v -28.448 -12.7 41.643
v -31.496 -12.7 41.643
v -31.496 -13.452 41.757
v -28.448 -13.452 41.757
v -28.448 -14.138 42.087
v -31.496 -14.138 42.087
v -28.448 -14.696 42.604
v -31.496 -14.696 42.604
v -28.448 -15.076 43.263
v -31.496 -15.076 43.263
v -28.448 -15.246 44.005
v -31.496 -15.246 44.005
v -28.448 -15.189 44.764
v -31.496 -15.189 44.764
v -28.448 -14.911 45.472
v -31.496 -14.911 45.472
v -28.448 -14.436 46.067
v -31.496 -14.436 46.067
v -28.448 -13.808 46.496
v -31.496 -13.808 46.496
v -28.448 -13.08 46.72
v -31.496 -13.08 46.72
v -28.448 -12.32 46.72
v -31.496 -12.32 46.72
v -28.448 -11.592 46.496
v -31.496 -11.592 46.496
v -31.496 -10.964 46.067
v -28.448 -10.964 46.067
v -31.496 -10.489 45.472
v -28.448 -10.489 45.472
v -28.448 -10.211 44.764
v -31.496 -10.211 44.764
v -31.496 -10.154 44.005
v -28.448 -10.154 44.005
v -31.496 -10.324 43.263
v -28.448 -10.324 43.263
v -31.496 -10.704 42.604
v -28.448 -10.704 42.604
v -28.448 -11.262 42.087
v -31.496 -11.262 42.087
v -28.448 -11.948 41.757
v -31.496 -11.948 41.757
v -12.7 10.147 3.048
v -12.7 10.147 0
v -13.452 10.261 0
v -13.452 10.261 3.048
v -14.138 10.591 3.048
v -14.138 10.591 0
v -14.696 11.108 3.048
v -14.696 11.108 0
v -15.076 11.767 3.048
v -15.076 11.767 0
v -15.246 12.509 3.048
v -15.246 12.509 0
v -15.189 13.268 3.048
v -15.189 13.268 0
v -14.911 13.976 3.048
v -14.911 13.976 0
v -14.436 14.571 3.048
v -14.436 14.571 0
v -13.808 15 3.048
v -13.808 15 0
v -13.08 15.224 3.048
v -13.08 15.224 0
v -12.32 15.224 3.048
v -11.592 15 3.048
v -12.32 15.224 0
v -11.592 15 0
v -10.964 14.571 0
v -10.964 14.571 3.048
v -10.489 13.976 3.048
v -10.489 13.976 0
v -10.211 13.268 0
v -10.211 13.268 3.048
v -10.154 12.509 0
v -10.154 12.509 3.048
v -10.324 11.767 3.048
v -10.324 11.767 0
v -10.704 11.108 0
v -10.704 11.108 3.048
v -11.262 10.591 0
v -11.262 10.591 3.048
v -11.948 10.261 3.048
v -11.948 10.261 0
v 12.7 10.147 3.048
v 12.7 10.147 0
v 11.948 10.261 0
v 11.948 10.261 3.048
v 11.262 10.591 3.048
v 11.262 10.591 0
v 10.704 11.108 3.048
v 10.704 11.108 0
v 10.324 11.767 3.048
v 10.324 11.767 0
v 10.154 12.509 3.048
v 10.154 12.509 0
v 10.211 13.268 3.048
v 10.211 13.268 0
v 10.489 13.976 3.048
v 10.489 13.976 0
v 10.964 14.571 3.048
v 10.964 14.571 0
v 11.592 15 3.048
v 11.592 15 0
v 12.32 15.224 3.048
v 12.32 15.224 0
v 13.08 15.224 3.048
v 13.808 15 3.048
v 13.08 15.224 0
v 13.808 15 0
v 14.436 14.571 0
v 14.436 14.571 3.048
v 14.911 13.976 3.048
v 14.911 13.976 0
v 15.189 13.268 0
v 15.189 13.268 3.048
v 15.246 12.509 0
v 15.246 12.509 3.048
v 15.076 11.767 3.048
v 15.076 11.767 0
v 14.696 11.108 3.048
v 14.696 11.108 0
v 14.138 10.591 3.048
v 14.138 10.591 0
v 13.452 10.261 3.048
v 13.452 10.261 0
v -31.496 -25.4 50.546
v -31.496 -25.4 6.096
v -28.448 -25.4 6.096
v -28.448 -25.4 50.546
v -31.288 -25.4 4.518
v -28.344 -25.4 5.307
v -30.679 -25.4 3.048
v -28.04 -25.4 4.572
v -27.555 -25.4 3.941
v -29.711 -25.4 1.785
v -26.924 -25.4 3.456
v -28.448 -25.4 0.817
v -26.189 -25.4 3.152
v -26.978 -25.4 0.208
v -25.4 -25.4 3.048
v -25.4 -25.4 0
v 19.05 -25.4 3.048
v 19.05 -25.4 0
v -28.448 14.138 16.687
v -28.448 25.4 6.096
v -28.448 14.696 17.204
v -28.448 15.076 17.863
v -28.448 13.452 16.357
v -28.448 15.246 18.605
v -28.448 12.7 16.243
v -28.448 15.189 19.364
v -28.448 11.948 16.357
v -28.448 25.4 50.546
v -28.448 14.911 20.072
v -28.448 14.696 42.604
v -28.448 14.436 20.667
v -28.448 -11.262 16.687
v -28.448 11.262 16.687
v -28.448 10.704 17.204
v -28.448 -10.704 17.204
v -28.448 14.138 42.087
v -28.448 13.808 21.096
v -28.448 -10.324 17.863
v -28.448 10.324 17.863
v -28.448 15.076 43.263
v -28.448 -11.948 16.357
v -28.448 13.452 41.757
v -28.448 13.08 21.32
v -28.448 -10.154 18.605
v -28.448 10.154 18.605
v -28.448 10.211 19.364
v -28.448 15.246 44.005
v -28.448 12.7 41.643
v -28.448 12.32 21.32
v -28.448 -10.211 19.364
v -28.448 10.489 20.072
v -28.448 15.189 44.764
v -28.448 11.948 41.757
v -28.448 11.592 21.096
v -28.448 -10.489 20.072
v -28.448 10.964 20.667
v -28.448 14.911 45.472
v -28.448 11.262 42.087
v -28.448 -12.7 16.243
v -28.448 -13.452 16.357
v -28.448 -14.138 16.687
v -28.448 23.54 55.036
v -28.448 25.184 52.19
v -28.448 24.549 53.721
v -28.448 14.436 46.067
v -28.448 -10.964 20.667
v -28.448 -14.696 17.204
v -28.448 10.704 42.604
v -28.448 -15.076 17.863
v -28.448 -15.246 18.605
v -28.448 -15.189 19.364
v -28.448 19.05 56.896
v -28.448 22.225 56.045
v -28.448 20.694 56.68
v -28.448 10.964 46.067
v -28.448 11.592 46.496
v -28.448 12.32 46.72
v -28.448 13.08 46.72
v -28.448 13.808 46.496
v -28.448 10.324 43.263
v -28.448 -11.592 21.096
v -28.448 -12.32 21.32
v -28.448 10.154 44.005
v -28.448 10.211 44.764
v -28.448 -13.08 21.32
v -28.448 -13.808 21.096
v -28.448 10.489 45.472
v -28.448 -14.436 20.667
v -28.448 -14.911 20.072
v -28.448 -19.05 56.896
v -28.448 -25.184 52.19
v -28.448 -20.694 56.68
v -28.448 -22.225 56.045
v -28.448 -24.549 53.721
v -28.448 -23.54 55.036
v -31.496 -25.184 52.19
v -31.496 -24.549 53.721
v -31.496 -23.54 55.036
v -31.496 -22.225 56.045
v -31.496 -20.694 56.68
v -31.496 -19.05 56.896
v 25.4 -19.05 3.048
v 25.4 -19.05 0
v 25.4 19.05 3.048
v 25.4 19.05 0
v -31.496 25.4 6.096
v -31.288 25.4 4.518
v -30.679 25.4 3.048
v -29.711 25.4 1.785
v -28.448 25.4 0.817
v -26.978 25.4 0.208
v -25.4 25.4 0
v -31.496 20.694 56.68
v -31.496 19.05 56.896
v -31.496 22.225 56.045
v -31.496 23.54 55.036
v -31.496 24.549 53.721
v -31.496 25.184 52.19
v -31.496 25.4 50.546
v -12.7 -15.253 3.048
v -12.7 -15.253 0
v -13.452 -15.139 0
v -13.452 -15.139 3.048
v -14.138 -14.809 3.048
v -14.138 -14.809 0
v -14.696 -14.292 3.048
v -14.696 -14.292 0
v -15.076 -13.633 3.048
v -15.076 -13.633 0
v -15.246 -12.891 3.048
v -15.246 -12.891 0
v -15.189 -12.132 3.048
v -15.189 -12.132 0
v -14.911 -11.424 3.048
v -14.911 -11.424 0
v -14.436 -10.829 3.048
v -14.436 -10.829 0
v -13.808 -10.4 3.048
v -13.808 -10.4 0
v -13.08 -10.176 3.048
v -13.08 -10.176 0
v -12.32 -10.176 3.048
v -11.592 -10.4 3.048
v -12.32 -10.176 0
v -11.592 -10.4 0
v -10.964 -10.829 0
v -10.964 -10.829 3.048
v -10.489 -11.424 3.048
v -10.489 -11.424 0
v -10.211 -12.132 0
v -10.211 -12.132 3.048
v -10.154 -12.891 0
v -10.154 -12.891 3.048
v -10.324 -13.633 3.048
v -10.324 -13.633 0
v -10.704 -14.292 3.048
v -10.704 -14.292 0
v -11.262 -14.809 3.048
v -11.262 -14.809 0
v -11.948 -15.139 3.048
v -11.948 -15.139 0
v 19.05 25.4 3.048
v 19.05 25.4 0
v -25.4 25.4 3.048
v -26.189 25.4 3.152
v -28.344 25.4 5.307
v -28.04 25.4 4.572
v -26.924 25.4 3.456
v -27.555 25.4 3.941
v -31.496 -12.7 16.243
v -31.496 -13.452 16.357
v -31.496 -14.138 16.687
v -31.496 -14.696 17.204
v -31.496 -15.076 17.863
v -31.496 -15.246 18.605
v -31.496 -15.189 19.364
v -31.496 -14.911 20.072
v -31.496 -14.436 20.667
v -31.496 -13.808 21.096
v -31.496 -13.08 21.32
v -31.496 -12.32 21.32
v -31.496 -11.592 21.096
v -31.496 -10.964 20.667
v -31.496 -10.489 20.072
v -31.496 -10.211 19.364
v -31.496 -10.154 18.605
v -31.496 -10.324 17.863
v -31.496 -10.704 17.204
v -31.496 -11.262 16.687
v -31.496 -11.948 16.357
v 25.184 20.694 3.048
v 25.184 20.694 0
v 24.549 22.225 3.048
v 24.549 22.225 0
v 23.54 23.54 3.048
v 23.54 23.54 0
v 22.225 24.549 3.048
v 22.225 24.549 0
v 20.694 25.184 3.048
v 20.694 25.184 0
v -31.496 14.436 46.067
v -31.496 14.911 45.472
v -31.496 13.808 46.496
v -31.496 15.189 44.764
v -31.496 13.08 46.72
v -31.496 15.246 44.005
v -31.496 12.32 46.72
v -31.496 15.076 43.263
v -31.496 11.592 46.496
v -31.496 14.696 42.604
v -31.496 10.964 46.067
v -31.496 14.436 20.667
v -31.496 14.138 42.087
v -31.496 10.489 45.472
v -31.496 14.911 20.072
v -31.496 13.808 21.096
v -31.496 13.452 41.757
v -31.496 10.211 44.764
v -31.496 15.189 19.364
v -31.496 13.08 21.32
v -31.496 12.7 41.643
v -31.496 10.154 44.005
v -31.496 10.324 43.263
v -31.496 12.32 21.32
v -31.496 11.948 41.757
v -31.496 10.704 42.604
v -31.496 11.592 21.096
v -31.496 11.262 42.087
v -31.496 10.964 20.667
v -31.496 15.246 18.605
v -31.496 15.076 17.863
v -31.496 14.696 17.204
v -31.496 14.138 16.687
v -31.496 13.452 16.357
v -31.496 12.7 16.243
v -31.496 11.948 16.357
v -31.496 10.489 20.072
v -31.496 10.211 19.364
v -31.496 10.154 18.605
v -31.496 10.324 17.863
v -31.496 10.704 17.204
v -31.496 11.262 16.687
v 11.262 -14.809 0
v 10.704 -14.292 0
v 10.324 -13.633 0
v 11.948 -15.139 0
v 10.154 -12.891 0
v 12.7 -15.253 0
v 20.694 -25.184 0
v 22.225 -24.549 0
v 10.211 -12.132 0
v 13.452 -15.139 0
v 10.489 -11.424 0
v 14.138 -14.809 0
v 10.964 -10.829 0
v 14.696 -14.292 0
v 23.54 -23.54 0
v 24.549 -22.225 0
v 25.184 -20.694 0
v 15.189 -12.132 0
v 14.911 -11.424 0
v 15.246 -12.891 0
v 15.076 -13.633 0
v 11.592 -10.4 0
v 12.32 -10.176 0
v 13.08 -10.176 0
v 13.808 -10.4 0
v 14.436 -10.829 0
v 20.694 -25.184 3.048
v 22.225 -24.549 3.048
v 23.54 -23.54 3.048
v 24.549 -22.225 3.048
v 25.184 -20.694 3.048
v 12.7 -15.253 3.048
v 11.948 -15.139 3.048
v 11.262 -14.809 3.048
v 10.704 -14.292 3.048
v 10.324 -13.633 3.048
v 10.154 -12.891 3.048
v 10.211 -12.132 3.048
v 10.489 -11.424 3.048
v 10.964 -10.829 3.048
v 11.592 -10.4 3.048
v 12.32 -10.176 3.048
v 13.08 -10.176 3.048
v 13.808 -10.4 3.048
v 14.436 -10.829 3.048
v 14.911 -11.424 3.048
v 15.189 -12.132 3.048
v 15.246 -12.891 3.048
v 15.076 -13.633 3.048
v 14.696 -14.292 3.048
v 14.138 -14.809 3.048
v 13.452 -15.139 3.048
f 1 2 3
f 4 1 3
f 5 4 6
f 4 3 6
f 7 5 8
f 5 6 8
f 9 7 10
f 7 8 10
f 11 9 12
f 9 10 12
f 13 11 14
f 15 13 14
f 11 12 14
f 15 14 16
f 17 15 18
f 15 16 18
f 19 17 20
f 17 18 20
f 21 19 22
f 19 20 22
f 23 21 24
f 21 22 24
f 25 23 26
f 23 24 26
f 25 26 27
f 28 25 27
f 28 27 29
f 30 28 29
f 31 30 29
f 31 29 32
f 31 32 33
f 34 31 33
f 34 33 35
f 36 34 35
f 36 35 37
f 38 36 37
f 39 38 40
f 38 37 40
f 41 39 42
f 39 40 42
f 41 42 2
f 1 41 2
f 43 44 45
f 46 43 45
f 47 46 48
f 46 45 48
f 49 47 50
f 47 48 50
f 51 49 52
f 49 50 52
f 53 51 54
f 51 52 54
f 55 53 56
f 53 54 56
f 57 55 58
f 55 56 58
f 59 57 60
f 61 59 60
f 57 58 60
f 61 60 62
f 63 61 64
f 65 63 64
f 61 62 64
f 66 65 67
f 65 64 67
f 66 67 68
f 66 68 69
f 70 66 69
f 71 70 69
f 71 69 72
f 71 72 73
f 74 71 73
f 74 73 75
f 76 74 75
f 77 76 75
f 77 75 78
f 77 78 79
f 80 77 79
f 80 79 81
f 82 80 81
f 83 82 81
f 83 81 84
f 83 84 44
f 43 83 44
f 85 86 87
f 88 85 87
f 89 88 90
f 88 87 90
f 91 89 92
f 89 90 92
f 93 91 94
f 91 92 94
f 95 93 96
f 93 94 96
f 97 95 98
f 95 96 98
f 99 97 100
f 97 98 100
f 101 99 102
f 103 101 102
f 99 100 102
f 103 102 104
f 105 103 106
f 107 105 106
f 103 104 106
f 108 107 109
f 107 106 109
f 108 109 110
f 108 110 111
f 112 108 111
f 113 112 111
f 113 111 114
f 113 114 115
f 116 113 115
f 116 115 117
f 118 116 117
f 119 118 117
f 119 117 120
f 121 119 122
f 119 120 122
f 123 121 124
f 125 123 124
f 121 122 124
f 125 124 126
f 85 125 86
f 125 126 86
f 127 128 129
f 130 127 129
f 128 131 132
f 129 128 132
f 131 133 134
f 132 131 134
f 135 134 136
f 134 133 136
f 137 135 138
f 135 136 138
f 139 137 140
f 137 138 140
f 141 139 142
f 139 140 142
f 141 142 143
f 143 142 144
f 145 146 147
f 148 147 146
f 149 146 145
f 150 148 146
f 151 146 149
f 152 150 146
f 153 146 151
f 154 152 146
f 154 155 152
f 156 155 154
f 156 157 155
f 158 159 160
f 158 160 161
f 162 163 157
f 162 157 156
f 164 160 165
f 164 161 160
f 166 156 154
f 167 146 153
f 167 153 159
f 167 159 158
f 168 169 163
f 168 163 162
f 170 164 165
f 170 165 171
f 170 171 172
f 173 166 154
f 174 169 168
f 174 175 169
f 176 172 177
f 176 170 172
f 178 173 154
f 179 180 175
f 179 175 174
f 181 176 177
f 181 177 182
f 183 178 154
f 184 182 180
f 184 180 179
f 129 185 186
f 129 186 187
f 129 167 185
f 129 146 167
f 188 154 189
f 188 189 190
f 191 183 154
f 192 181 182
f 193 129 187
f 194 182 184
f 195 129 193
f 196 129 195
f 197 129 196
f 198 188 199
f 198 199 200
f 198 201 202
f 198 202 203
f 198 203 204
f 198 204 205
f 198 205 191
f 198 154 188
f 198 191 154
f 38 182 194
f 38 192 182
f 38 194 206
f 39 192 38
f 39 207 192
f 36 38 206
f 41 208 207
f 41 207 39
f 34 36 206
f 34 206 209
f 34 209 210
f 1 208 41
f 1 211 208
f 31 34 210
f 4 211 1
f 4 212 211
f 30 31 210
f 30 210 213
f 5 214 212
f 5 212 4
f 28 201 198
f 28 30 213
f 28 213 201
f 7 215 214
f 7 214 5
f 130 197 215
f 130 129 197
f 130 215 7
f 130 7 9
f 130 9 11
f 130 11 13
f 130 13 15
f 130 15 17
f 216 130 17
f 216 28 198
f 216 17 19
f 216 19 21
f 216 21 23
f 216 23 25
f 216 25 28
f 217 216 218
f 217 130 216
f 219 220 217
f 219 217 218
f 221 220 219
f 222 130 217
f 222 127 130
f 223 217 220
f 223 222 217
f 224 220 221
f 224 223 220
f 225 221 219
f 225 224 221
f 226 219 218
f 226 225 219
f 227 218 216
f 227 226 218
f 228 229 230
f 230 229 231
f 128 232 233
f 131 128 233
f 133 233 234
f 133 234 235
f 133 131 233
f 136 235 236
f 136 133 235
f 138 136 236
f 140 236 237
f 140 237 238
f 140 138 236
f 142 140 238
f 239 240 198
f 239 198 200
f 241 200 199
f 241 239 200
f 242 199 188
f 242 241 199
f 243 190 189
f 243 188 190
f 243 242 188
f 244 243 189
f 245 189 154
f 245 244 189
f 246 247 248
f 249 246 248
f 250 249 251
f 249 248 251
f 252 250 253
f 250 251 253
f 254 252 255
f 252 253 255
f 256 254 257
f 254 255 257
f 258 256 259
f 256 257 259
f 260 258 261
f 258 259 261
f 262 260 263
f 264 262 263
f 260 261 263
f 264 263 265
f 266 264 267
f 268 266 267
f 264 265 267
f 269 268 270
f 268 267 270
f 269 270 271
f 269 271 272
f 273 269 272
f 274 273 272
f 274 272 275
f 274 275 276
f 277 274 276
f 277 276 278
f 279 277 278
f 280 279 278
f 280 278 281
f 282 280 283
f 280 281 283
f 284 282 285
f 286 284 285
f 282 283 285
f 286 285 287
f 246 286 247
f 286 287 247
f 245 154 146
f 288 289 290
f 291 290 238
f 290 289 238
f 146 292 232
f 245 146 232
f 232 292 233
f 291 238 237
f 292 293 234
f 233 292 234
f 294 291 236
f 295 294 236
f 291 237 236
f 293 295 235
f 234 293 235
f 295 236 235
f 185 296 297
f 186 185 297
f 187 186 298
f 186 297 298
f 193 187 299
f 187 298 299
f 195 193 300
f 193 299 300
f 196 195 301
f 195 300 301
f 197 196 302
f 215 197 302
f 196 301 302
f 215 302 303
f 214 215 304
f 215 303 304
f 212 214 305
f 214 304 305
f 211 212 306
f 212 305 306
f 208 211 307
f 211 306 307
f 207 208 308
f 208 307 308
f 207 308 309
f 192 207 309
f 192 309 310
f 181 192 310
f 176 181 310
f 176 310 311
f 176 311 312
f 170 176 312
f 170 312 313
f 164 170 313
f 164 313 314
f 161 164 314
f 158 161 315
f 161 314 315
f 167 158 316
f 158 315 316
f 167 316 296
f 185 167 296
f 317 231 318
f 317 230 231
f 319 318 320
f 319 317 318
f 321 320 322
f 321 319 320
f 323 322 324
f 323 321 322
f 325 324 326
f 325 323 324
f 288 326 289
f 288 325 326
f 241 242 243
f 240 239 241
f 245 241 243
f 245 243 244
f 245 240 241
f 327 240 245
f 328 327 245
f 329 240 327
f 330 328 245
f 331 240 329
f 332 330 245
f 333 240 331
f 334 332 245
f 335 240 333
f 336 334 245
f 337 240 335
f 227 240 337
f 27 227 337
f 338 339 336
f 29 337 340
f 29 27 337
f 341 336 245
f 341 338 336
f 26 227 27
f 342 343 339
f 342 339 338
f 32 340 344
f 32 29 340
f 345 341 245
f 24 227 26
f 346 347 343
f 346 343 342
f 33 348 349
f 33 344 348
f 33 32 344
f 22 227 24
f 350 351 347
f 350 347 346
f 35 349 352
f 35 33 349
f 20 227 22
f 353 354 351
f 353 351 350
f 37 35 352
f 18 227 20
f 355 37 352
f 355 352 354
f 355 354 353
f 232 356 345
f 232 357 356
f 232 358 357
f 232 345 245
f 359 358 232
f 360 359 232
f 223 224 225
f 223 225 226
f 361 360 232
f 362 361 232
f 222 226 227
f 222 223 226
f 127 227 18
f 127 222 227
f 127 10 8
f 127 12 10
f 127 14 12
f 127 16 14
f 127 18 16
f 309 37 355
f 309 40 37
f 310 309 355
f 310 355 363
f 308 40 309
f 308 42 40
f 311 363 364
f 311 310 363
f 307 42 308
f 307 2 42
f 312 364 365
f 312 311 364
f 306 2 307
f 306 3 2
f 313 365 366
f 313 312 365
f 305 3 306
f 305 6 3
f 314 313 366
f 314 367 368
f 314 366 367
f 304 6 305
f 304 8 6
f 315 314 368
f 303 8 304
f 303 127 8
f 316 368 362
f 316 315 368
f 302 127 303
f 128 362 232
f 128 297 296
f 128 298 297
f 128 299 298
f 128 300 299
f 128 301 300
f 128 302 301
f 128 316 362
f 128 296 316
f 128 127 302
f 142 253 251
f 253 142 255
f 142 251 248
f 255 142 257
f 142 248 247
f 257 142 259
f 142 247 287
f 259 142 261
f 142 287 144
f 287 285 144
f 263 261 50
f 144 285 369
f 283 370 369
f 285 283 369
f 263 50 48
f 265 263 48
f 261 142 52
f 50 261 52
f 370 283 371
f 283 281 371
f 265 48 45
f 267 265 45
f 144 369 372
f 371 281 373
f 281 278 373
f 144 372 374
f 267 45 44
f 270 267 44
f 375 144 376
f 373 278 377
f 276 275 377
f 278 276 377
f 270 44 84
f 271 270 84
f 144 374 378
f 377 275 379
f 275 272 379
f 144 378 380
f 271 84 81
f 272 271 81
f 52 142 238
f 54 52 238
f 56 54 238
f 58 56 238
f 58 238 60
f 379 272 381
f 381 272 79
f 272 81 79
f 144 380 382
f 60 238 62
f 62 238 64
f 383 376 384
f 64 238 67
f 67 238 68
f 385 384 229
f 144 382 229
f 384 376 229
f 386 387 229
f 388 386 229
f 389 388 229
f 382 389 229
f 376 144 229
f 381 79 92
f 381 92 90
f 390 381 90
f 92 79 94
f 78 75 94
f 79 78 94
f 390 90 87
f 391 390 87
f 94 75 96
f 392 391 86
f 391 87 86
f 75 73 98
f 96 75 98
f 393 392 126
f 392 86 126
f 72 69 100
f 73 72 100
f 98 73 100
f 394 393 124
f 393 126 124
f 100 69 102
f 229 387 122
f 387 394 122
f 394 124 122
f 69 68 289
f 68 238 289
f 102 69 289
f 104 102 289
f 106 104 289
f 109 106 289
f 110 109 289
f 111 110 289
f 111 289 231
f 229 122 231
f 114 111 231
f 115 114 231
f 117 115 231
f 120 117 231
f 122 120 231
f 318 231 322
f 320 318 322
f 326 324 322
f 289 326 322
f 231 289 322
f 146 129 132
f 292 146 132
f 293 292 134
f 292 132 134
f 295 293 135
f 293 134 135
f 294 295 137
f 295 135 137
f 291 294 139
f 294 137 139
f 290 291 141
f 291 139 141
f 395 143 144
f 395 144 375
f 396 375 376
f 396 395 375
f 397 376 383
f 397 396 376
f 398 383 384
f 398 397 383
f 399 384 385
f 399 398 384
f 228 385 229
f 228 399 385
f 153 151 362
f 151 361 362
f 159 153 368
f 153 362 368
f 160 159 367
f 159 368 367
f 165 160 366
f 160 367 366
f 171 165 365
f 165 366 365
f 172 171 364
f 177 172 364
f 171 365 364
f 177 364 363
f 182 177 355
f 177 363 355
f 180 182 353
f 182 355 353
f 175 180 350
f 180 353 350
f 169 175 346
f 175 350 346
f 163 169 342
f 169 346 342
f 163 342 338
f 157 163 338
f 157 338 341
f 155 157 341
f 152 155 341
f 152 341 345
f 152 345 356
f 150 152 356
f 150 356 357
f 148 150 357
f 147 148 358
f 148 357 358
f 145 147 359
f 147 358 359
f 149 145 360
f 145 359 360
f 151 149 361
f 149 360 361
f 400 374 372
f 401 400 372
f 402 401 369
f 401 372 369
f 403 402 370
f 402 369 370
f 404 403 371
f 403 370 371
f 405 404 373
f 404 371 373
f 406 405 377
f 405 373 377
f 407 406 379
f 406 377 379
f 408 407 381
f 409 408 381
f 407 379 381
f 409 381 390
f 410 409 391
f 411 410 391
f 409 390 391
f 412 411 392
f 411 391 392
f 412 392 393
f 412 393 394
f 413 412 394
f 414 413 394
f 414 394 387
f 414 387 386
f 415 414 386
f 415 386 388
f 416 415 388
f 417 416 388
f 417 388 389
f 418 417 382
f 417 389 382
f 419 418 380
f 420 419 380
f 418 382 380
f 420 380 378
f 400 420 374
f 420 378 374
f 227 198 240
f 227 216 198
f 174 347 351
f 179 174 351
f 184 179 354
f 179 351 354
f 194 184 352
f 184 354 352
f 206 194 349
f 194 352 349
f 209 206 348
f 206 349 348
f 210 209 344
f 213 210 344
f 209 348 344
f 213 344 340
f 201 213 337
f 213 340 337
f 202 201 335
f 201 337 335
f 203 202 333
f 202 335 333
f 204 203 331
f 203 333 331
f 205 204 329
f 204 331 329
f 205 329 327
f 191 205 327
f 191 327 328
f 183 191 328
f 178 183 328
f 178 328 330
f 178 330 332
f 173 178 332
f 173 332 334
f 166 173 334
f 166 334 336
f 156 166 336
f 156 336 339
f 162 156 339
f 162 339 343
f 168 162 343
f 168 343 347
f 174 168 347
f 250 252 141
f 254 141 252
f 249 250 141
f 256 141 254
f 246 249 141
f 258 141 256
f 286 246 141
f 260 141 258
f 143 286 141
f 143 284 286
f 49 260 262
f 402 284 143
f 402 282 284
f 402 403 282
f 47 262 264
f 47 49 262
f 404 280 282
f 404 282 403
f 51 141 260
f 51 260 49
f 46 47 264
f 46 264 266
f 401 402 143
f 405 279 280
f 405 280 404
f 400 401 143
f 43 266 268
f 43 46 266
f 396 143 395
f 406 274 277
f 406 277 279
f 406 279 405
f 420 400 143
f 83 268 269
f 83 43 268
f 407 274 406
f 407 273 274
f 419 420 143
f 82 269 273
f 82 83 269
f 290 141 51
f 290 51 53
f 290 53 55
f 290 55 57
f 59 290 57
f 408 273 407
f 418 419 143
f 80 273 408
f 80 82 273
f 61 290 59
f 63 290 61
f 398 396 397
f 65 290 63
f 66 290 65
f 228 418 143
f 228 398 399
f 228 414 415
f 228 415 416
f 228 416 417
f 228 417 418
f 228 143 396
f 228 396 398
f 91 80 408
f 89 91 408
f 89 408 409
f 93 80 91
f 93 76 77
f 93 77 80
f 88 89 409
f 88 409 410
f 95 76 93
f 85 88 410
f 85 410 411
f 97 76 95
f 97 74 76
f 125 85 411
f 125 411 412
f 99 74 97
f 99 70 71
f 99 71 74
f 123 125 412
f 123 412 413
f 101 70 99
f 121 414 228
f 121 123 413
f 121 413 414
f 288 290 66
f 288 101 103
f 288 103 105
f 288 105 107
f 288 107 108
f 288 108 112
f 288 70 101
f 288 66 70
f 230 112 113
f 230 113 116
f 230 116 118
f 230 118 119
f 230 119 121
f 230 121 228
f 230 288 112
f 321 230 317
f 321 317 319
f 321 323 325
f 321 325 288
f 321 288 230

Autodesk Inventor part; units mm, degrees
ref_plane "YZ Plane" through (0, 0, 0) normal (1, 0, 0) x (0, 1, 0)
ref_plane "XZ Plane" through (0, 0, 0) normal (0, 1, 0) x (-1, 0, 0)
ref_plane "XY Plane" through (0, 0, 0) normal (0, 0, 1) x (1, 0, 0)
sketch "Sketch1" plane through (0, 0, 0) normal (0, 0, 1) x (1, 0, 0)
  line L0 (25.4, 25.4) -> (-25.4, 25.4)
  line L1 (-25.4, 25.4) -> (-25.4, -25.4)
  line L2 (-25.4, -25.4) -> (25.4, -25.4)
  line L3 (25.4, -25.4) -> (25.4, 25.4)
  line L4 (25.4, 25.4) -> (-25.4, -25.4) construction
  line L5 (-25.4, 25.4) -> (25.4, -25.4) construction
  point P0 (0, 0)
  dimension "d0" = 50.8
  dimension "d1" = 50.8
extrude "Plate1" add sketch "Sketch1" along normal blind 3.048
sketch "Sketch2" plane through (-28.448, -25.4, 6.096) normal (-1, 0, 0) x (0, -1, 0)
  line L0 (-50.8, 0) -> (0, 0)
  line L1 (0, 0) -> (0, 50.8)
  line L2 (0, 50.8) -> (-50.8, 50.8)
  line L3 (-50.8, 50.8) -> (-50.8, 0)
edge flange "Flange1" height 56.896 angle 90 thickness 3.048 bend radius 3.048 thickness toward (-1, 0, 0) relief tear relief width 3.048 relief depth 1.524 edges at (-25.4, 0, 3.048) wall of the first edge with corners at (-28.448, 25.4, 6.096) (-28.448, -25.4, 6.096) (-28.448, -25.4, 56.896) (-28.448, 25.4, 56.896)
bend "Bend1"
corner "Corner1"
sketch "Sketch3" plane through (-28.448, -25.4, 56.896) normal (1, 0, 0) x (0, 0, -1)
  line L0 (50.8, 0) -> (50.8, 50.8) construction
  line L1 (0, 50.8) -> (50.8, 50.8) construction
  line L2 (0, 50.8) -> (0, 0) construction
  line L3 (0, 0) -> (50.8, 0) construction
  point P0 (56.896, 25.4)
  point P1 (38.1, 38.1)
  point P2 (38.1, 12.7)
  point P3 (12.7, 38.1)
  point P4 (12.7, 12.7)
  dimension "d13" = 12.7
  dimension "d14" = 12.7
  dimension "d17" = 25.4
  dimension "d20" = 25.4
hole "Hole1" at (-28.448, 12.7, 18.796) at (-28.448, -12.7, 18.796) at (-28.448, 12.7, 44.196) at (-28.448, -12.7, 44.196) direction (-1, 0, 0) diameter 5.1054 end through all clearance for "Flat Head Machine Screw (82)" size "#10" standard "Ansi Unified Screw Threads"
sketch "Sketch4" plane through (0, 0, 3.048) normal (0, 0, 1) x (1, 0, 0)
  line L0 (-25.4, 25.4) -> (25.4, 25.4) construction
  line L1 (-25.4, -25.4) -> (-25.4, 25.4) construction
  line L2 (25.4, -25.4) -> (-25.4, -25.4) construction
  line L3 (25.4, 25.4) -> (25.4, -25.4) construction
  point P0 (0, 0)
  point P1 (-12.7, 12.7)
  point P2 (12.7, 12.7)
  point P3 (-12.7, -12.7)
  point P4 (12.7, -12.7)
  dimension "d30" = 12.7
  dimension "d31" = 12.7
  dimension "d34" = 25.4
  dimension "d37" = 25.4
hole "Hole2" at (-12.7, 12.7, 3.048) at (12.7, 12.7, 3.048) at (-12.7, -12.7, 3.048) at (12.7, -12.7, 3.048) direction (0, 0, -1) diameter 5.1054 end through all clearance for "Flat Head Machine Screw (82)" size "#10" standard "Ansi Unified Screw Threads"
fillet "Corner Round1" radius 6.35 4 edges at (-29.972, -25.4, 56.896) (-29.972, 25.4, 56.896) (25.4, 25.4, 1.524) (25.4, -25.4, 1.524)
equation "\"d28\" = Thickness"
equation "\"d2\" = Thickness"
equation "\"d3\" = BendReliefWidth"
equation "\"d4\" = BendReliefDepth"
equation "\"d5\" = MinimumRemnant"
equation "\"d6\" = TransitionRadius"
equation "\"d9\" = BendRadius"
equation "\"d10\" = CornerReliefSize"
equation "\"d11\" = GapSize"
equation "\"d12\" = JacobiRadiusSize"
equation "\"BendRadius\" = Thickness"
equation "\"BendReliefWidth\" = Thickness"
equation "\"BendReliefDepth\" = 0.5 * Thickness"
equation "\"CornerReliefSize\" = 4 * Thickness"
equation "\"MinimumRemnant\" = 2 * Thickness"
equation "\"TransitionRadius\" = BendRadius"
equation "\"JacobiRadiusSize\" = BendRadius"
equation "\"GapSize\" = Thickness"
equation "\"Thickness\" = 3.048"
properties part number "hopper_side_bracket" material "Aluminum 6061"
